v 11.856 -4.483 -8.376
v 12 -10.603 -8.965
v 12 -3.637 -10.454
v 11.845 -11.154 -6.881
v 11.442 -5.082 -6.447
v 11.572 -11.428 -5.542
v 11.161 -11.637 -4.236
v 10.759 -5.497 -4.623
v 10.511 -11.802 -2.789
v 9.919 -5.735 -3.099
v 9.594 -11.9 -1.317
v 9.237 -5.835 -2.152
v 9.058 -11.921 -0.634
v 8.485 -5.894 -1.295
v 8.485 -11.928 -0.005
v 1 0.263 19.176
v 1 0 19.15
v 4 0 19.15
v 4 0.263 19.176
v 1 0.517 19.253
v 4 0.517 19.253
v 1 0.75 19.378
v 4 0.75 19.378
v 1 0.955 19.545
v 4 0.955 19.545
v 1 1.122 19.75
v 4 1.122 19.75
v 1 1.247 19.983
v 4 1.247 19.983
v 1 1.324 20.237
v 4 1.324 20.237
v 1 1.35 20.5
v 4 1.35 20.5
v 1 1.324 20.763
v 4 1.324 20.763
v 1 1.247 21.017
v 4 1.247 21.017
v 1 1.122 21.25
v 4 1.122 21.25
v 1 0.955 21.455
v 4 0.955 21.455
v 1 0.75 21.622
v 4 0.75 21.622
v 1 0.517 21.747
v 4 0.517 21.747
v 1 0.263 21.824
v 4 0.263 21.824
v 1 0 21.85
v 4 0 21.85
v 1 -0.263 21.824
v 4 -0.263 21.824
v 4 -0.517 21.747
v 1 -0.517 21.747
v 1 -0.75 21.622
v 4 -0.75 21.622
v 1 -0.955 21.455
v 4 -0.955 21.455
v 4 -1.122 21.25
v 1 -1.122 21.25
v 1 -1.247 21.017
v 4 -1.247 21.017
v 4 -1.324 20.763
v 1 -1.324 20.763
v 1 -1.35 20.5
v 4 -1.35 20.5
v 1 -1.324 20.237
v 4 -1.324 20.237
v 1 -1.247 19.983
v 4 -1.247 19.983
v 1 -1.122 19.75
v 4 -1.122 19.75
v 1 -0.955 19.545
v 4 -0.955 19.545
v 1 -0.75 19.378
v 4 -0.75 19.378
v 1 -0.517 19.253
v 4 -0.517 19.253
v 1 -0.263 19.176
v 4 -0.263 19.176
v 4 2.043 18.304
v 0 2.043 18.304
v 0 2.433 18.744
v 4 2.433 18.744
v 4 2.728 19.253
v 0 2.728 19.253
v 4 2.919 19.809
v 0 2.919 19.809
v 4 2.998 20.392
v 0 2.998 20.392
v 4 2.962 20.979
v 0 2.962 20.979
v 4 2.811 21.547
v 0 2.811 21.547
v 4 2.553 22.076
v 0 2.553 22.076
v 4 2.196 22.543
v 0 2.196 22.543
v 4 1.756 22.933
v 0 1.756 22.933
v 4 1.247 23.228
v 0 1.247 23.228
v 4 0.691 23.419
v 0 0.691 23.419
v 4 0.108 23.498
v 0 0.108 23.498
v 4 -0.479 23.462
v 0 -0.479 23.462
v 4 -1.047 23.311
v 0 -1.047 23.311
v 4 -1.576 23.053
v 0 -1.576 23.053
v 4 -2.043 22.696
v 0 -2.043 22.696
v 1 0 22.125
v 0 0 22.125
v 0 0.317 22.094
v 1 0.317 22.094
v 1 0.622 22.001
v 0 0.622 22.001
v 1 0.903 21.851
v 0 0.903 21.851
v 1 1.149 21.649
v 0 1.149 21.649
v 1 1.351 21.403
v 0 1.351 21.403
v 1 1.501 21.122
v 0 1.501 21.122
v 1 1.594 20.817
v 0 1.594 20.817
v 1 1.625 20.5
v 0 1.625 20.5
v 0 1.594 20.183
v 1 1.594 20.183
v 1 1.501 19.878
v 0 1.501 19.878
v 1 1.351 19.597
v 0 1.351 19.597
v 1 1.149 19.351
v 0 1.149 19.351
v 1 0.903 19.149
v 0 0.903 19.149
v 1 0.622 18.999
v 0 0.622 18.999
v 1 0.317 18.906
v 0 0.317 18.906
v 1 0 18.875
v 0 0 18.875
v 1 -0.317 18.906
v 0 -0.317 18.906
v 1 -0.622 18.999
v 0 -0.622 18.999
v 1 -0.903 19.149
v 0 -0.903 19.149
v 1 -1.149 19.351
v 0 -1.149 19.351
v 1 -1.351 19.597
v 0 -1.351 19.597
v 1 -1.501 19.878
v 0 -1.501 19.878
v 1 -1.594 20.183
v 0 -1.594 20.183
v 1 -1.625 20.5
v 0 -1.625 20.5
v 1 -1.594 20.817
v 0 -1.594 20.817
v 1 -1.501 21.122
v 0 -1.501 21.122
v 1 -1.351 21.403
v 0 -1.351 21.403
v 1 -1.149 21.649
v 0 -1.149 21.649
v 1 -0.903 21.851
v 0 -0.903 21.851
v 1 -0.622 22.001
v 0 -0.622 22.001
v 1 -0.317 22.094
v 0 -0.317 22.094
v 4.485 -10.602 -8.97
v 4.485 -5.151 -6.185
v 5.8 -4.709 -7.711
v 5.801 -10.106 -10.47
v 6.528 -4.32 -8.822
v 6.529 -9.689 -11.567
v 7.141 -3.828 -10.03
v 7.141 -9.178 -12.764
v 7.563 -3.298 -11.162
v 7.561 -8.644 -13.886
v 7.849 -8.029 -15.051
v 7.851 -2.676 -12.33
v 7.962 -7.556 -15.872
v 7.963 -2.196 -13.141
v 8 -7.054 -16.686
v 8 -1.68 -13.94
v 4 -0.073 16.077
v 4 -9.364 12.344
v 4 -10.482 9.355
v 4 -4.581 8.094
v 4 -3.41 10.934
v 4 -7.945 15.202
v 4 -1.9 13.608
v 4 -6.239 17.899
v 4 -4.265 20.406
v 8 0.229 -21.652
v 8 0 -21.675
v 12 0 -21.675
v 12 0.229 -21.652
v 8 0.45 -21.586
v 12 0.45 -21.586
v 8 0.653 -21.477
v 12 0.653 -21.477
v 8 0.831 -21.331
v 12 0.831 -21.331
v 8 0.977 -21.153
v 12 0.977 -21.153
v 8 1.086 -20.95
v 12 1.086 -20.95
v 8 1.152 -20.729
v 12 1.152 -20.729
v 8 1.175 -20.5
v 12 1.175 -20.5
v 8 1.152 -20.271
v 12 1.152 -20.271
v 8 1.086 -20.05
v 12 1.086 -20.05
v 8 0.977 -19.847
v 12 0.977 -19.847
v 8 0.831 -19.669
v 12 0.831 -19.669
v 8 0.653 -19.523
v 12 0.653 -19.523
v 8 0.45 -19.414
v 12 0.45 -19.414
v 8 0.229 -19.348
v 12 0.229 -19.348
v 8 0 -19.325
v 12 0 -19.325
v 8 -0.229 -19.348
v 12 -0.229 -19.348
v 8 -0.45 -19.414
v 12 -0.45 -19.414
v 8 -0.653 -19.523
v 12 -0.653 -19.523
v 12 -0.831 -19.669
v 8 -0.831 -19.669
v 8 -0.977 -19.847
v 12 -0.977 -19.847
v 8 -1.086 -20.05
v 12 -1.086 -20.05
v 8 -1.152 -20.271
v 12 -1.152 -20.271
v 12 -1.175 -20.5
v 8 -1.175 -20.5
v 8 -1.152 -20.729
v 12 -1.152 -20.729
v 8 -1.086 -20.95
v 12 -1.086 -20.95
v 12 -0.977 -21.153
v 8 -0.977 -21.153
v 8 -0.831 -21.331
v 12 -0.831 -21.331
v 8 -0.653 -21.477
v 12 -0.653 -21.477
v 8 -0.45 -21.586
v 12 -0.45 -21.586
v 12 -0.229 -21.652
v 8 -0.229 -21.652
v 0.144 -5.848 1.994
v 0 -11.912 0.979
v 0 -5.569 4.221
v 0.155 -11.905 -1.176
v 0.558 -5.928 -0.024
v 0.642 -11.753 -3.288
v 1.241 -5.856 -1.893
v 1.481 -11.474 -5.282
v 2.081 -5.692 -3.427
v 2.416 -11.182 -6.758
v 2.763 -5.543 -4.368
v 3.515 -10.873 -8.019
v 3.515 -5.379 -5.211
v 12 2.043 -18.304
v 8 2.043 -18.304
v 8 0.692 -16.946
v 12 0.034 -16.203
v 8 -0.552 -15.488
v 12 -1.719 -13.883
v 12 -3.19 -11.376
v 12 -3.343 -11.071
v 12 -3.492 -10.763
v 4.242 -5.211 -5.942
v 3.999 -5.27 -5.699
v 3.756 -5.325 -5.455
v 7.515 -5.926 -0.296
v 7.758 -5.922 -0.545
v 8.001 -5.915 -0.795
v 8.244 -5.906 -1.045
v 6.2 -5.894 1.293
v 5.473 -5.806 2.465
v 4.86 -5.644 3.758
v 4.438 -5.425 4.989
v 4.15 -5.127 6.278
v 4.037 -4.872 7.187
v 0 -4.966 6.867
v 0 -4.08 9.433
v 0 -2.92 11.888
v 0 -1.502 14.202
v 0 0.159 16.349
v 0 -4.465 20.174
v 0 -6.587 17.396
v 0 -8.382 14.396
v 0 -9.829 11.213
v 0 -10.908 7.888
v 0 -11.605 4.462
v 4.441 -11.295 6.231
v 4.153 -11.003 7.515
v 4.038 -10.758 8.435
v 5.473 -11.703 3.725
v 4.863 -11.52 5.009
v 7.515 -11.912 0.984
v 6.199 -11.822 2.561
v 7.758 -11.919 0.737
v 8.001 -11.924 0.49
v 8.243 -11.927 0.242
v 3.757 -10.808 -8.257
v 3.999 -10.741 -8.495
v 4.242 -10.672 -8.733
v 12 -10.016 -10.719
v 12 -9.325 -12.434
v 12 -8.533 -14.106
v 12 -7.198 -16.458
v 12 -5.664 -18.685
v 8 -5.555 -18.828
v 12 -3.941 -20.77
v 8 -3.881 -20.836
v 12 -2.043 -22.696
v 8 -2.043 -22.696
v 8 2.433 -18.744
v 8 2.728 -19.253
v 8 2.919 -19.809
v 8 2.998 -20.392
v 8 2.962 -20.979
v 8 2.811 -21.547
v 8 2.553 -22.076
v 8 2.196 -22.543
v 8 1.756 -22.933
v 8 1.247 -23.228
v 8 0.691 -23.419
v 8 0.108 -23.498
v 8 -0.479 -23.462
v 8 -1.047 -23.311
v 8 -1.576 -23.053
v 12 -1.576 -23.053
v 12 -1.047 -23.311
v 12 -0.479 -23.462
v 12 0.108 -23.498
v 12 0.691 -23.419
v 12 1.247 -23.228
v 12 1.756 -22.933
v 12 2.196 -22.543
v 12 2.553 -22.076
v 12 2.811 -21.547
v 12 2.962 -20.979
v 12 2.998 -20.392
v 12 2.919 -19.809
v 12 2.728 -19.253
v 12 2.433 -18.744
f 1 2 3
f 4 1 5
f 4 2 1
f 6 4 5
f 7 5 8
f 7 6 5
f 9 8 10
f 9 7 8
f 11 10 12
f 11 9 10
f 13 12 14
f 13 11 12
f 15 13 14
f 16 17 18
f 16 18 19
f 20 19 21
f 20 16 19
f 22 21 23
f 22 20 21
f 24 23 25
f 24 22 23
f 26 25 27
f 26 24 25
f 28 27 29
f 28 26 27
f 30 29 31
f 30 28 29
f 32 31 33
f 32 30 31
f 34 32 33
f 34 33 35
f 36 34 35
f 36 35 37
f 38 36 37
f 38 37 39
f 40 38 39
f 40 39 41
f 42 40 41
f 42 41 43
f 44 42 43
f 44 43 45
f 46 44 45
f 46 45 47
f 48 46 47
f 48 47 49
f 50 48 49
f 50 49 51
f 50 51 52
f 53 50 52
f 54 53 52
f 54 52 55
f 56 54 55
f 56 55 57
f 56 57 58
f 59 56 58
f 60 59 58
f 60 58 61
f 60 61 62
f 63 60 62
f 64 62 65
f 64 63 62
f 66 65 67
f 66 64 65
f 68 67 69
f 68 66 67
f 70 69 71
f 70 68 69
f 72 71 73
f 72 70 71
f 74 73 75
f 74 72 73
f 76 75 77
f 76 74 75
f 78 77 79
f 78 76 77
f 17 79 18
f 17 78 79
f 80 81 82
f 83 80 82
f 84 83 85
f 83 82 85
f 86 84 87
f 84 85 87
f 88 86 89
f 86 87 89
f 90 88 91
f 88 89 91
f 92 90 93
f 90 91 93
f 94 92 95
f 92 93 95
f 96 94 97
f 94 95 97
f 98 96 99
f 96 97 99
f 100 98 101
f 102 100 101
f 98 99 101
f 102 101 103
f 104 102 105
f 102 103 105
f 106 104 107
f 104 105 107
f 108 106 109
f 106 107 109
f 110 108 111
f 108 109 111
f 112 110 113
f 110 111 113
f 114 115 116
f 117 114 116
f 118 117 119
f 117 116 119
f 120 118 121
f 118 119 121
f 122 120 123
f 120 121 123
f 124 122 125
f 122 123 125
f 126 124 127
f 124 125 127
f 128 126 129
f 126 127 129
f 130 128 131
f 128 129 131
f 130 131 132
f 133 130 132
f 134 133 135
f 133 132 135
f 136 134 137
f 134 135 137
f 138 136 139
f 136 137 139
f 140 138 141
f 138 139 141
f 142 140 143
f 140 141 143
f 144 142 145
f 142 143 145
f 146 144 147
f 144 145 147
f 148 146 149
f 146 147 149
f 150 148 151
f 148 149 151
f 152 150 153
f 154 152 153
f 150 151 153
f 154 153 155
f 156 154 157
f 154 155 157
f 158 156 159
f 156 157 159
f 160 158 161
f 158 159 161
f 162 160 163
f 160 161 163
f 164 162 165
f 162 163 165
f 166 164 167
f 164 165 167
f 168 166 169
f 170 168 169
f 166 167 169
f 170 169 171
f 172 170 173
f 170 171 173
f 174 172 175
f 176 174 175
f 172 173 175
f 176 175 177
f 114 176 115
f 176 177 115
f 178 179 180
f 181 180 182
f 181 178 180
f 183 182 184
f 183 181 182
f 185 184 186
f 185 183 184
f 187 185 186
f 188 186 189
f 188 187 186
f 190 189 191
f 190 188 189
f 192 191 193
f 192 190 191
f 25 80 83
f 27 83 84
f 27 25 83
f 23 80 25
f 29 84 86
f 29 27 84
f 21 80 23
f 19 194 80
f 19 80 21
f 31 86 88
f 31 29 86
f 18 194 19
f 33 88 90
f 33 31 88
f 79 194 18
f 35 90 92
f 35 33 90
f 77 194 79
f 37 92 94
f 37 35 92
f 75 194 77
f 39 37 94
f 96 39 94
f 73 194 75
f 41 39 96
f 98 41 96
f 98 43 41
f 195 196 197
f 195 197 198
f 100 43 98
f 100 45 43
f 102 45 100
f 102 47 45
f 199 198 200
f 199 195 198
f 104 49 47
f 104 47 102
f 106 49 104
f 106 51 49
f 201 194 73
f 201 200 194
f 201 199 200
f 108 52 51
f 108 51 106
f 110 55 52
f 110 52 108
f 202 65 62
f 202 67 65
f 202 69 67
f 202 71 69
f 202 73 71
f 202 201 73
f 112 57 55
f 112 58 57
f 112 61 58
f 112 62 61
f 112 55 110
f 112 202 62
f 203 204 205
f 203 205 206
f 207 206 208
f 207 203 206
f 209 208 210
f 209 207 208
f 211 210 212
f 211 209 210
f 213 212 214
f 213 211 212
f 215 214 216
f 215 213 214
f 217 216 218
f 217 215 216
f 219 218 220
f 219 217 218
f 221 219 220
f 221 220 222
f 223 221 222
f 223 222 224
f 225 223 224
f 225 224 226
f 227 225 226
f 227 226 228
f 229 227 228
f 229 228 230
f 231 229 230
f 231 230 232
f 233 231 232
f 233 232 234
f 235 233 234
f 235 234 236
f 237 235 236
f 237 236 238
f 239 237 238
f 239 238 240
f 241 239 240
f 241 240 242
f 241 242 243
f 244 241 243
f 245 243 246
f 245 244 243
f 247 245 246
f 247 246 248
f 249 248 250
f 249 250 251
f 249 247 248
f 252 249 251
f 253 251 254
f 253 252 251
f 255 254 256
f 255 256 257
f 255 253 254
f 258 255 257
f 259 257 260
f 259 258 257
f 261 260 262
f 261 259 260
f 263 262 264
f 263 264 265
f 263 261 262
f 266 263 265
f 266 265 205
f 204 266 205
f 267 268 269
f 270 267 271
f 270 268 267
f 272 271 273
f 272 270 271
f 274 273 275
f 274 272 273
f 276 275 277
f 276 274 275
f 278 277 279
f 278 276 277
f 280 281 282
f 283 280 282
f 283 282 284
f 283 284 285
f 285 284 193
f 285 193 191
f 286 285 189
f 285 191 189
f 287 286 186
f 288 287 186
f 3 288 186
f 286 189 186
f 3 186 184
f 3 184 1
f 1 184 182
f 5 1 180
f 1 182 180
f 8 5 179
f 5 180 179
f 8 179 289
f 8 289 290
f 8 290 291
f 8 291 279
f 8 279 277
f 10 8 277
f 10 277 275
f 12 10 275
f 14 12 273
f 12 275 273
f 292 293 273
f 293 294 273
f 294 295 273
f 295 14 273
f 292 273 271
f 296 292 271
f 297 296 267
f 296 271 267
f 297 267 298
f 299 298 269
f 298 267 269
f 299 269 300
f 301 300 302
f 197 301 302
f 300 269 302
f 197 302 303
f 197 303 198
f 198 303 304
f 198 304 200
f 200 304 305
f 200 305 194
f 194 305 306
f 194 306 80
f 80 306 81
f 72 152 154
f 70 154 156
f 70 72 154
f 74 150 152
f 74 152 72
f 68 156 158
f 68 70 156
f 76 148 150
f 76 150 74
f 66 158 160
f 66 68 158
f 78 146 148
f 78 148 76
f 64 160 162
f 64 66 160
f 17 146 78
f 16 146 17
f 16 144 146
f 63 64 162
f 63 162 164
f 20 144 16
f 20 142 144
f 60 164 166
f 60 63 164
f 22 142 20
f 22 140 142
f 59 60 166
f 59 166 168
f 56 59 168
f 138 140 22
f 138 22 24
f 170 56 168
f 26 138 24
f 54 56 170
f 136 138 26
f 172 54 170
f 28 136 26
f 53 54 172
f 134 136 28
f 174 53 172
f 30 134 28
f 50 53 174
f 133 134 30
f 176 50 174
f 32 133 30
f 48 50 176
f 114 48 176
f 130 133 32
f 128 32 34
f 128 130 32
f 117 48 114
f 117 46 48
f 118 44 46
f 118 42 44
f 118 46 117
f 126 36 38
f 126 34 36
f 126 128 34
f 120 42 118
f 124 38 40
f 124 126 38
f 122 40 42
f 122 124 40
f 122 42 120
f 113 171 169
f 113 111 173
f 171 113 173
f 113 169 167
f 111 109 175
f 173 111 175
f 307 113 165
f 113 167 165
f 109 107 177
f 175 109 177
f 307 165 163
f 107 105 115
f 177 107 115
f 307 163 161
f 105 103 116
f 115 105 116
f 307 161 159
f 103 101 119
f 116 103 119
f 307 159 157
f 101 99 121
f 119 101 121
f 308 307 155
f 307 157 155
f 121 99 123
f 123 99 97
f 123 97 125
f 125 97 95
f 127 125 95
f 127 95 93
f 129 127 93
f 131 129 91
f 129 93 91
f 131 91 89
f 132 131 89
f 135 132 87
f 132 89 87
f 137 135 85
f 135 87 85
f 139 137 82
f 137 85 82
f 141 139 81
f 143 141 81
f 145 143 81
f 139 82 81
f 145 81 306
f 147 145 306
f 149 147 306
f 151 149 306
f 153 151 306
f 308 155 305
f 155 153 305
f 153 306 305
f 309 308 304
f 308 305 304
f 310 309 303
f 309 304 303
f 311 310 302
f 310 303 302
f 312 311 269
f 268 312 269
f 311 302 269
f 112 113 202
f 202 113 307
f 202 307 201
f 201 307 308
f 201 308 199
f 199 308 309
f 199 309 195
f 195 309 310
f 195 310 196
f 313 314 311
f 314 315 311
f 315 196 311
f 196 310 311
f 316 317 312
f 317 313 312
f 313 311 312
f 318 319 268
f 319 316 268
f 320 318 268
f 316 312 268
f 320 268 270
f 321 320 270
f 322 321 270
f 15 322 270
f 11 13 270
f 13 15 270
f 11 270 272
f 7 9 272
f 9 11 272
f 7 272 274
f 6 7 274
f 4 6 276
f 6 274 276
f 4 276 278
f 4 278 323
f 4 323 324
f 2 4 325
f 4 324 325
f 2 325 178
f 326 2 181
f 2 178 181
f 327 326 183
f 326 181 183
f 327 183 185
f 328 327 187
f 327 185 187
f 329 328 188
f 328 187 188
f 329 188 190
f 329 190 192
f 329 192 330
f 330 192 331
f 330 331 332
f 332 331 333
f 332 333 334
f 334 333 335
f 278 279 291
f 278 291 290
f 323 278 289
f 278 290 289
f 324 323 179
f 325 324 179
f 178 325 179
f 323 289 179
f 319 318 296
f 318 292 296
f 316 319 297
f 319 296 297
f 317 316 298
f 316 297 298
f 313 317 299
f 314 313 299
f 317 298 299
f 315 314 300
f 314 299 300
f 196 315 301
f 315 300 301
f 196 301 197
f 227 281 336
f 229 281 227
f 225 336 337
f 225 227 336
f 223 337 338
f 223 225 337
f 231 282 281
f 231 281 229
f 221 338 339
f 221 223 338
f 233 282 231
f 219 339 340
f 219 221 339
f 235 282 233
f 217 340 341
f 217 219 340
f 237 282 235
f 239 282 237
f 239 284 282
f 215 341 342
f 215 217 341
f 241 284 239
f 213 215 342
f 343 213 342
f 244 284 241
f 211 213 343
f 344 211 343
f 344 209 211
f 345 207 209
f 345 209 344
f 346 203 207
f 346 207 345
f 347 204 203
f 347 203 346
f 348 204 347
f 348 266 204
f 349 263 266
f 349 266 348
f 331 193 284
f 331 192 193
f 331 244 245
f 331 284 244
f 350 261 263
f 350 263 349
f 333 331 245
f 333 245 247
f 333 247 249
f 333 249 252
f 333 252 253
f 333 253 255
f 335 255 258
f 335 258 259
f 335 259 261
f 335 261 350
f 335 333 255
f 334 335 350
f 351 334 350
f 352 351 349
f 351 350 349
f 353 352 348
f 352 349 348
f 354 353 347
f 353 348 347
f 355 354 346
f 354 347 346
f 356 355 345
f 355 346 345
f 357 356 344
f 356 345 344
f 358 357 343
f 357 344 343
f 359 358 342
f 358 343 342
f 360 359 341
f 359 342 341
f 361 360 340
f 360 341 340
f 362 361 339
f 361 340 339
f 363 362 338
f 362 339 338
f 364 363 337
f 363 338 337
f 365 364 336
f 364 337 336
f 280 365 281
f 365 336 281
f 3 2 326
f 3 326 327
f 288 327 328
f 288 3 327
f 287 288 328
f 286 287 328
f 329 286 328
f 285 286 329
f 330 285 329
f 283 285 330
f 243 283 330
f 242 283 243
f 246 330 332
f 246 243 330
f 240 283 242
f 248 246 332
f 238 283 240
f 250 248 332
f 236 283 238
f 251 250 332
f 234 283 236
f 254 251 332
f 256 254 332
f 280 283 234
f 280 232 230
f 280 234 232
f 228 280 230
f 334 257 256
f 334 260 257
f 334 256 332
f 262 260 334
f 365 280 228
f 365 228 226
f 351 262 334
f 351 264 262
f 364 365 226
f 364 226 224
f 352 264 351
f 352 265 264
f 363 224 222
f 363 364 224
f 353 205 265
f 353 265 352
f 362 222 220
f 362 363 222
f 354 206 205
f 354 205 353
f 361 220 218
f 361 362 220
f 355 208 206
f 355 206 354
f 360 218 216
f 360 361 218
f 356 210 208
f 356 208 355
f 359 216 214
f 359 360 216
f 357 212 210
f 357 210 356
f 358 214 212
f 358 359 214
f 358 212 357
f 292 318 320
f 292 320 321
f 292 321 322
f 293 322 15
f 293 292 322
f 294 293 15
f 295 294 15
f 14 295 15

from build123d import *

# Parameters (mm, degrees)
SKETCH_1_R          = 1.175
SKETCH_1_R_2        = 1.35
EXTRUDE_1_DEPTH     = 4
SKETCH_1_5_R        = 1.175
EXTRUDE_2_DEPTH     = 12
SKETCH_1_6_R        = 1.175
CUT_EXTRUDE_1_DEPTH = 8
SKETCH_3_R          = 1.625
CUT_EXTRUDE_2_DEPTH = 1
CHAMFER_1_SIZE      = 10
FILLET_1_R          = 12


with BuildPart() as part:
    # 草图1 → 凸台-拉伸1 (new body)
    with BuildSketch(Plane(origin=(0, 0, 0), x_dir=(0, 0, -1), z_dir=(1, 0, 0))):
        with BuildLine():
            ThreePointArc((-22.696428571, -2.043453335), (0, -11.927768877), (22.696428571, -2.043453335))
            ThreePointArc((22.696428571, -2.043453335), (22.543453335, 2.196428571), (18.303571429, 2.043453335))
            ThreePointArc((18.303571429, 2.043453335), (0, -5.927768877), (-18.303571429, 2.043453335))
            ThreePointArc((-18.303571429, 2.043453335), (-22.543453335, 2.196428571), (-22.696428571, -2.043453335))
        make_face()
        with Locations((20.5, 0)):
            Circle(SKETCH_1_R, mode=Mode.SUBTRACT)
        with Locations((-20.5, 0)):
            Circle(SKETCH_1_R_2, mode=Mode.SUBTRACT)
    extrude(amount=EXTRUDE_1_DEPTH)

    # 草图1<5> → 凸台-拉伸2 (add)
    # profile 1 of 2: a face of its own
    with BuildSketch(Plane(origin=(0, 0, 0), x_dir=(0, 0, -1), z_dir=(1, 0, 0))):
        with BuildLine():
            Line((-5.226102274, -5.375424287), (-6.48036682, -11.242861585))
            ThreePointArc((-6.48036682, -11.242861585), (4.046311959, -11.66255958), (14.105677022, -8.532657498))
            Line((14.105677022, -8.532657498), (11.375545986, -3.189775829))
            ThreePointArc((11.375545986, -3.189775829), (3.263154806, -5.713890412), (-5.226102274, -5.375424287))
        make_face()
    # profile 2 of 2: a face of its own
    with BuildSketch(Plane(origin=(0, 0, 0), x_dir=(0, 0, -1), z_dir=(1, 0, 0))):
        with BuildLine():
            Line((11.375545986, -3.189775829), (14.105677022, -8.532657498))
            ThreePointArc((14.105677022, -8.532657498), (18.684918697, -5.663852102), (22.696428571, -2.043453335))
            ThreePointArc((22.696428571, -2.043453335), (22.543453335, 2.196428571), (18.303571429, 2.043453335))
            ThreePointArc((18.303571429, 2.043453335), (15.06848282, -0.876223091), (11.375545986, -3.189775829))
        make_face()
        with Locations((20.5, 0)):
            Circle(SKETCH_1_5_R, mode=Mode.SUBTRACT)
    extrude(amount=EXTRUDE_2_DEPTH)

    # 草图1<6> → 切除-拉伸1 (cut)
    with BuildSketch(Plane(origin=(0, 0, 0), x_dir=(0, 0, -1), z_dir=(1, 0, 0))):
        with BuildLine():
            Line((11.375545986, -3.189775829), (14.105677022, -8.532657498))
            ThreePointArc((14.105677022, -8.532657498), (18.684918697, -5.663852102), (22.696428571, -2.043453335))
            ThreePointArc((22.696428571, -2.043453335), (22.543453335, 2.196428571), (18.303571429, 2.043453335))
            ThreePointArc((18.303571429, 2.043453335), (15.06848282, -0.876223091), (11.375545986, -3.189775829))
        make_face()
        with Locations((20.5, 0)):
            Circle(SKETCH_1_6_R, mode=Mode.SUBTRACT)
    extrude(amount=CUT_EXTRUDE_1_DEPTH, mode=Mode.SUBTRACT)

    # 草图3 → 切除-拉伸2 (cut)
    with BuildSketch(Plane.ZY):
        with Locations((20.5, 0)):
            Circle(SKETCH_3_R)
    extrude(amount=-CUT_EXTRUDE_2_DEPTH, mode=Mode.SUBTRACT)

    # 倒角1
    # the kernel refuses this chamfer: 10 mm, written as the material it adds along each edge
    # the kernel refuses this chamfer: 10 mm, written as the material it takes off along each edge
    with BuildSketch(Plane(origin=(12, 19.773223518, -0.149849051), x_dir=(-0.9996219169112968, 0.005747850531589265, 0.02688838866222917), z_dir=(0, -0.9779062163770691, 0.20904409097385418))) as chamfer_1_2_piece_1_section:
        Polygon((CHAMFER_1_SIZE * 0.999621916911, CHAMFER_1_SIZE * 0.0274958766106), (-CHAMFER_1_SIZE * 0.0274958766106, CHAMFER_1_SIZE * 0.999621916911), (0, 0), align=None)
    chamfer_1_2_piece_1 = extrude(amount=57.433659759, mode=Mode.PRIVATE)
    chamfer_1_2_piece_1 = split(chamfer_1_2_piece_1, bisect_by=Plane(origin=(4, -8.720114363, 2.38807711), z_dir=(1, 0, 0)), keep=Keep.TOP, mode=Mode.PRIVATE)
    add(chamfer_1_2_piece_1, mode=Mode.SUBTRACT)
    with BuildSketch(Plane(origin=(0, 19.710553993, 0.32617325), x_dir=(-0.02749587661058638, -0.45484980336482234, 0.8901436025430942), z_dir=(0, -0.8904802780770589, -0.45502183942730046))) as chamfer_1_2_piece_2_section:
        Polygon((CHAMFER_1_SIZE * 0.999621916911, -CHAMFER_1_SIZE * 0.0274958766106), (-CHAMFER_1_SIZE * 0.0274958766106, -CHAMFER_1_SIZE * 0.999621916911), (0, 0), align=None)
    chamfer_1_2_piece_2 = extrude(amount=57.433659759, mode=Mode.PRIVATE)
    chamfer_1_2_piece_2 = split(chamfer_1_2_piece_2, bisect_by=Plane(origin=(8, -7.155033318, -9.499893675), z_dir=(-1, 0, 0)), keep=Keep.TOP, mode=Mode.PRIVATE)
    add(chamfer_1_2_piece_2, mode=Mode.SUBTRACT)

    # 圆角1
    fillet_1_edges = [part.edges().sort_by_distance(p)[0] for p in [
        (12, -8.568786932, -4.317191604),
        (8, -6.706828834, -10.92672743),
        (4, -8.656473826, 3.88229654),
        (0, -8.74431349, -2.983935031),
    ]]
    fillet(fillet_1_edges, radius=FILLET_1_R)


solid = part.part
